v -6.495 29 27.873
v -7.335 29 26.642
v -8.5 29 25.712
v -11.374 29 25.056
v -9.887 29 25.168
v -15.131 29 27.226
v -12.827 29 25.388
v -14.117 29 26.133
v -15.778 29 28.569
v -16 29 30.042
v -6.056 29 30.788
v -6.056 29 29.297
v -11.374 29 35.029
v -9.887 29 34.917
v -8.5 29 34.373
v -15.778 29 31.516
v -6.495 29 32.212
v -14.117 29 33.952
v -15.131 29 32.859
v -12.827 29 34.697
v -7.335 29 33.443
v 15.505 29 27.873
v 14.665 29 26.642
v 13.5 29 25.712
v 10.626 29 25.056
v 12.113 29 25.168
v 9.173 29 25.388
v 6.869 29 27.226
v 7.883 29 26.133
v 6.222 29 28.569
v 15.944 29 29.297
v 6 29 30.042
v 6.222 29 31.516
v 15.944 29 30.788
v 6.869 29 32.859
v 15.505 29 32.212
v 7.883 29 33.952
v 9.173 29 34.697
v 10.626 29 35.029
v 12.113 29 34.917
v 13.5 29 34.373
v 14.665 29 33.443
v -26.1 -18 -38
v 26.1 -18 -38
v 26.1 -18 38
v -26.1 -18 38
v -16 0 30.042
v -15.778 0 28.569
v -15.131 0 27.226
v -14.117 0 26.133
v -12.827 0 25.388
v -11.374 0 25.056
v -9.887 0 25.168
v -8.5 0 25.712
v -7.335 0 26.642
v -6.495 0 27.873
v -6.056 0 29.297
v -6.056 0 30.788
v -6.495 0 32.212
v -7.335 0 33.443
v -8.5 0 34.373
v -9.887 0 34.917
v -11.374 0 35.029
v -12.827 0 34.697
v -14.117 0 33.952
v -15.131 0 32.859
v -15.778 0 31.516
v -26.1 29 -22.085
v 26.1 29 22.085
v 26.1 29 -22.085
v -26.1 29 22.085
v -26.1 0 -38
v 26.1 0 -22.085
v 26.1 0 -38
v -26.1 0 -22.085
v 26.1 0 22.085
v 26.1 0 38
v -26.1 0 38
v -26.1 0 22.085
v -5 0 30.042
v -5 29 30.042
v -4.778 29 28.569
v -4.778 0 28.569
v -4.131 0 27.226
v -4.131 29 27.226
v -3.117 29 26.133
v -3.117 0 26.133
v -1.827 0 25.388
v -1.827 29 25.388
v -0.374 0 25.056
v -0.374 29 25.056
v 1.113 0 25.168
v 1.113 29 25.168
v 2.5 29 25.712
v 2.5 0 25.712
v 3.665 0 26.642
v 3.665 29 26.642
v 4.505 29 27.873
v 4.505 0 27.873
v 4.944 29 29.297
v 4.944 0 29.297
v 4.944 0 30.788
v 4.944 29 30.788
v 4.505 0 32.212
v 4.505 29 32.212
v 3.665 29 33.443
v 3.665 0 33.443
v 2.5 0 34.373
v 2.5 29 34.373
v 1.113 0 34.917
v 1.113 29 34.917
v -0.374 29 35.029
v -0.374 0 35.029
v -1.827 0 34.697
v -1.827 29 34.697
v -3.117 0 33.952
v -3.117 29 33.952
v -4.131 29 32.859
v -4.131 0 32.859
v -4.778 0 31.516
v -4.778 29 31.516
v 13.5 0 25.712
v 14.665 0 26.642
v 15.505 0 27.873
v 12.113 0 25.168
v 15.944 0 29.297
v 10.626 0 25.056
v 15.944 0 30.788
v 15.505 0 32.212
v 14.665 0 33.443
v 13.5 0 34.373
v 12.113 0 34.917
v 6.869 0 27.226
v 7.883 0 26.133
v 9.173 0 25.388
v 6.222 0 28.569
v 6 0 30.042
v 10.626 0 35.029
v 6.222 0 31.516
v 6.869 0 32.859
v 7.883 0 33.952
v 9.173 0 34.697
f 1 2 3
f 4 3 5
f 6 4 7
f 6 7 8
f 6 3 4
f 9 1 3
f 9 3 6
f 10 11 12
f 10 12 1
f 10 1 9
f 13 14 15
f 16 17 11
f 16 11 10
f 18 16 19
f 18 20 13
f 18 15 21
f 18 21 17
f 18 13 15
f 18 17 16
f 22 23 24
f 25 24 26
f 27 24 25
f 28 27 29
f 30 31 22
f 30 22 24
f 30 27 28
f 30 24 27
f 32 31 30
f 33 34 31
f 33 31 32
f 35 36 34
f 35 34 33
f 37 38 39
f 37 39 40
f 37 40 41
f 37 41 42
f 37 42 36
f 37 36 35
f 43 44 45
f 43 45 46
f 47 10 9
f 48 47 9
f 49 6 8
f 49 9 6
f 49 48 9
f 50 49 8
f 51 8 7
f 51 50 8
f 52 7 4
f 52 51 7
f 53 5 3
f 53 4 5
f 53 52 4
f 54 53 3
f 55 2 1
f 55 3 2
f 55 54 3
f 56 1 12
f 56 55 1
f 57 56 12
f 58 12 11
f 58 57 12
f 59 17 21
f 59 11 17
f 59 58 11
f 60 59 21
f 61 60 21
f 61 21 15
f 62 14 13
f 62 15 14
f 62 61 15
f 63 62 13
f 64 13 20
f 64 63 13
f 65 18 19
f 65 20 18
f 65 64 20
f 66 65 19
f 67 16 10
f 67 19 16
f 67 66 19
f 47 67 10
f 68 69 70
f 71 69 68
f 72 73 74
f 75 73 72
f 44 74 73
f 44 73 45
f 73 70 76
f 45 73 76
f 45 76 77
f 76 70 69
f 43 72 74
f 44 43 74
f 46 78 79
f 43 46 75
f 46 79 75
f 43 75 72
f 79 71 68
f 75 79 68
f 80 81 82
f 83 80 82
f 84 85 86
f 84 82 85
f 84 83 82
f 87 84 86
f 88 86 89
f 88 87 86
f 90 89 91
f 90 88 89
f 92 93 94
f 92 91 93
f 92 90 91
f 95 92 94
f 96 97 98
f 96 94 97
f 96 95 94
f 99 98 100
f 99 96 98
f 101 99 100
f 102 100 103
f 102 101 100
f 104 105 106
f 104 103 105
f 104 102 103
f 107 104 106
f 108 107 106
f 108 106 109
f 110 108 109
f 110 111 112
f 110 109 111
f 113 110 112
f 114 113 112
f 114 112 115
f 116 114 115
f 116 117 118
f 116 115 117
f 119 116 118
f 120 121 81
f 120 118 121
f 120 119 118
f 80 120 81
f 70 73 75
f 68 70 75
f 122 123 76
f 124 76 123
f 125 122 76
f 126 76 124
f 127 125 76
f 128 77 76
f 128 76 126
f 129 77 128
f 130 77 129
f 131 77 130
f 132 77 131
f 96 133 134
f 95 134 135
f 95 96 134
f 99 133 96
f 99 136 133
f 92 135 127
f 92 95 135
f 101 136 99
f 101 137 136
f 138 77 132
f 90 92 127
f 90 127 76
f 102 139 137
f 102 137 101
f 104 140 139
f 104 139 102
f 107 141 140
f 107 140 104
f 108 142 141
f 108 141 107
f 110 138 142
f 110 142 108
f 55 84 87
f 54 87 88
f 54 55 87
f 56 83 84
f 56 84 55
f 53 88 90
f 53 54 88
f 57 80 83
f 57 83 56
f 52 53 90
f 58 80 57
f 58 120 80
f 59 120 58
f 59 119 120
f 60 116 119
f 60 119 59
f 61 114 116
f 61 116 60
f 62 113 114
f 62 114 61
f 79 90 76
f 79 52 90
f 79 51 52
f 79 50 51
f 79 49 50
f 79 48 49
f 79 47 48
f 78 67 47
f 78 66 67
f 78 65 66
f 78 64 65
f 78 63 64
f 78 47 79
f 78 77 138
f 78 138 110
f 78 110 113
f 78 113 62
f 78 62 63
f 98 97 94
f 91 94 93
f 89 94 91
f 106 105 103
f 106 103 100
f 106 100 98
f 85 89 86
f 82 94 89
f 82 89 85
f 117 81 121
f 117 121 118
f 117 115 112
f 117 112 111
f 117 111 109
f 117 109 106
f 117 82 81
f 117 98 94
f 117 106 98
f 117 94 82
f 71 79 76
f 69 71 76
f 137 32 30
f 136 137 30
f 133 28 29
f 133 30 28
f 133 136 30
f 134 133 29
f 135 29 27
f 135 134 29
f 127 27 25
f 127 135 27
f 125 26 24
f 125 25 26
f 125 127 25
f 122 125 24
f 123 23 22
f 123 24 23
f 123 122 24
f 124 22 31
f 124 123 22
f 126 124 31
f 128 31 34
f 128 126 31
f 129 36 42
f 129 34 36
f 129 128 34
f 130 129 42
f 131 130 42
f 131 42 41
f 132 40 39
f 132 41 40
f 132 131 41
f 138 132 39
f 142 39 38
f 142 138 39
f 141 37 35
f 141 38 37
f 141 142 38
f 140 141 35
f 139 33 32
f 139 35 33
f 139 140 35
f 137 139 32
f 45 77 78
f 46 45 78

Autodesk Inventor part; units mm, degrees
ref_plane "YZ Plane" through (0, 0, 0) normal (1, 0, 0) x (0, 1, 0)
ref_plane "XZ Plane" through (0, 0, 0) normal (0, 1, 0) x (-1, 0, 0)
ref_plane "XY Plane" through (0, 0, 0) normal (0, 0, 1) x (1, 0, 0)
sketch "Sketch2" plane through (0, 0, 0) normal (0, 1, 0) x (-1, 0, 0)
  line L0 (-26.1, 38) -> (26.1, 38)
  line L1 (26.1, 38) -> (26.1, -38)
  line L2 (26.1, -38) -> (-26.1, -38)
  line L3 (-26.1, -38) -> (-26.1, 38)
  line L4 (-26.1, 38) -> (26.1, -38) construction
  line L5 (26.1, 38) -> (-26.1, -38) construction
  line L6 (26.1, 22.085) -> (-26.1, 22.085)
  line L7 (-26.1, 22.085) -> (-26.1, -22.085)
  line L8 (-26.1, -22.085) -> (26.1, -22.085)
  line L9 (26.1, -22.085) -> (26.1, 22.085)
  line L10 (26.1, 22.085) -> (-26.1, -22.085) construction
  line L11 (-26.1, 22.085) -> (26.1, -22.085) construction
  line L12 (26.1, 38) -> (-26.1, 22.085) construction
  circle A0 centre (0, 30.0425) radius 5
  circle A1 centre (11, 30.0425) radius 5
  circle A2 centre (-11, 30.0425) radius 5
  point P0 (0, 0)
  dimension "d0" = 52.2
  dimension "d1" = 76
  dimension "d2" = 44.17
  dimension "OutCableDia" = 10
  dimension "d9" = 10
  dimension "d10" = 10
  dimension "d11" = 11
  dimension "d12" = 11
extrude "Extrusion1" add sketch "Sketch2" against normal blind 18 contours L0 L1 L6 L3 | L6 L1 L8 L3 | L8 L1 L2 L3 | A0 | A1 | A2
extrude "Extrusion2" add sketch "Sketch2" along normal blind 29 contours L6 L1 L8 L3
extrude "Extrusion3" add sketch "Sketch2" along normal blind 29 contours A0 | A1 | A2
equation "\"d9\" = OutCableDia"
equation "\"d10\" = OutCableDia"
equation "\"d12\" = d11"
properties part number "HobbyWing EZRUN 150A Pro 2"
